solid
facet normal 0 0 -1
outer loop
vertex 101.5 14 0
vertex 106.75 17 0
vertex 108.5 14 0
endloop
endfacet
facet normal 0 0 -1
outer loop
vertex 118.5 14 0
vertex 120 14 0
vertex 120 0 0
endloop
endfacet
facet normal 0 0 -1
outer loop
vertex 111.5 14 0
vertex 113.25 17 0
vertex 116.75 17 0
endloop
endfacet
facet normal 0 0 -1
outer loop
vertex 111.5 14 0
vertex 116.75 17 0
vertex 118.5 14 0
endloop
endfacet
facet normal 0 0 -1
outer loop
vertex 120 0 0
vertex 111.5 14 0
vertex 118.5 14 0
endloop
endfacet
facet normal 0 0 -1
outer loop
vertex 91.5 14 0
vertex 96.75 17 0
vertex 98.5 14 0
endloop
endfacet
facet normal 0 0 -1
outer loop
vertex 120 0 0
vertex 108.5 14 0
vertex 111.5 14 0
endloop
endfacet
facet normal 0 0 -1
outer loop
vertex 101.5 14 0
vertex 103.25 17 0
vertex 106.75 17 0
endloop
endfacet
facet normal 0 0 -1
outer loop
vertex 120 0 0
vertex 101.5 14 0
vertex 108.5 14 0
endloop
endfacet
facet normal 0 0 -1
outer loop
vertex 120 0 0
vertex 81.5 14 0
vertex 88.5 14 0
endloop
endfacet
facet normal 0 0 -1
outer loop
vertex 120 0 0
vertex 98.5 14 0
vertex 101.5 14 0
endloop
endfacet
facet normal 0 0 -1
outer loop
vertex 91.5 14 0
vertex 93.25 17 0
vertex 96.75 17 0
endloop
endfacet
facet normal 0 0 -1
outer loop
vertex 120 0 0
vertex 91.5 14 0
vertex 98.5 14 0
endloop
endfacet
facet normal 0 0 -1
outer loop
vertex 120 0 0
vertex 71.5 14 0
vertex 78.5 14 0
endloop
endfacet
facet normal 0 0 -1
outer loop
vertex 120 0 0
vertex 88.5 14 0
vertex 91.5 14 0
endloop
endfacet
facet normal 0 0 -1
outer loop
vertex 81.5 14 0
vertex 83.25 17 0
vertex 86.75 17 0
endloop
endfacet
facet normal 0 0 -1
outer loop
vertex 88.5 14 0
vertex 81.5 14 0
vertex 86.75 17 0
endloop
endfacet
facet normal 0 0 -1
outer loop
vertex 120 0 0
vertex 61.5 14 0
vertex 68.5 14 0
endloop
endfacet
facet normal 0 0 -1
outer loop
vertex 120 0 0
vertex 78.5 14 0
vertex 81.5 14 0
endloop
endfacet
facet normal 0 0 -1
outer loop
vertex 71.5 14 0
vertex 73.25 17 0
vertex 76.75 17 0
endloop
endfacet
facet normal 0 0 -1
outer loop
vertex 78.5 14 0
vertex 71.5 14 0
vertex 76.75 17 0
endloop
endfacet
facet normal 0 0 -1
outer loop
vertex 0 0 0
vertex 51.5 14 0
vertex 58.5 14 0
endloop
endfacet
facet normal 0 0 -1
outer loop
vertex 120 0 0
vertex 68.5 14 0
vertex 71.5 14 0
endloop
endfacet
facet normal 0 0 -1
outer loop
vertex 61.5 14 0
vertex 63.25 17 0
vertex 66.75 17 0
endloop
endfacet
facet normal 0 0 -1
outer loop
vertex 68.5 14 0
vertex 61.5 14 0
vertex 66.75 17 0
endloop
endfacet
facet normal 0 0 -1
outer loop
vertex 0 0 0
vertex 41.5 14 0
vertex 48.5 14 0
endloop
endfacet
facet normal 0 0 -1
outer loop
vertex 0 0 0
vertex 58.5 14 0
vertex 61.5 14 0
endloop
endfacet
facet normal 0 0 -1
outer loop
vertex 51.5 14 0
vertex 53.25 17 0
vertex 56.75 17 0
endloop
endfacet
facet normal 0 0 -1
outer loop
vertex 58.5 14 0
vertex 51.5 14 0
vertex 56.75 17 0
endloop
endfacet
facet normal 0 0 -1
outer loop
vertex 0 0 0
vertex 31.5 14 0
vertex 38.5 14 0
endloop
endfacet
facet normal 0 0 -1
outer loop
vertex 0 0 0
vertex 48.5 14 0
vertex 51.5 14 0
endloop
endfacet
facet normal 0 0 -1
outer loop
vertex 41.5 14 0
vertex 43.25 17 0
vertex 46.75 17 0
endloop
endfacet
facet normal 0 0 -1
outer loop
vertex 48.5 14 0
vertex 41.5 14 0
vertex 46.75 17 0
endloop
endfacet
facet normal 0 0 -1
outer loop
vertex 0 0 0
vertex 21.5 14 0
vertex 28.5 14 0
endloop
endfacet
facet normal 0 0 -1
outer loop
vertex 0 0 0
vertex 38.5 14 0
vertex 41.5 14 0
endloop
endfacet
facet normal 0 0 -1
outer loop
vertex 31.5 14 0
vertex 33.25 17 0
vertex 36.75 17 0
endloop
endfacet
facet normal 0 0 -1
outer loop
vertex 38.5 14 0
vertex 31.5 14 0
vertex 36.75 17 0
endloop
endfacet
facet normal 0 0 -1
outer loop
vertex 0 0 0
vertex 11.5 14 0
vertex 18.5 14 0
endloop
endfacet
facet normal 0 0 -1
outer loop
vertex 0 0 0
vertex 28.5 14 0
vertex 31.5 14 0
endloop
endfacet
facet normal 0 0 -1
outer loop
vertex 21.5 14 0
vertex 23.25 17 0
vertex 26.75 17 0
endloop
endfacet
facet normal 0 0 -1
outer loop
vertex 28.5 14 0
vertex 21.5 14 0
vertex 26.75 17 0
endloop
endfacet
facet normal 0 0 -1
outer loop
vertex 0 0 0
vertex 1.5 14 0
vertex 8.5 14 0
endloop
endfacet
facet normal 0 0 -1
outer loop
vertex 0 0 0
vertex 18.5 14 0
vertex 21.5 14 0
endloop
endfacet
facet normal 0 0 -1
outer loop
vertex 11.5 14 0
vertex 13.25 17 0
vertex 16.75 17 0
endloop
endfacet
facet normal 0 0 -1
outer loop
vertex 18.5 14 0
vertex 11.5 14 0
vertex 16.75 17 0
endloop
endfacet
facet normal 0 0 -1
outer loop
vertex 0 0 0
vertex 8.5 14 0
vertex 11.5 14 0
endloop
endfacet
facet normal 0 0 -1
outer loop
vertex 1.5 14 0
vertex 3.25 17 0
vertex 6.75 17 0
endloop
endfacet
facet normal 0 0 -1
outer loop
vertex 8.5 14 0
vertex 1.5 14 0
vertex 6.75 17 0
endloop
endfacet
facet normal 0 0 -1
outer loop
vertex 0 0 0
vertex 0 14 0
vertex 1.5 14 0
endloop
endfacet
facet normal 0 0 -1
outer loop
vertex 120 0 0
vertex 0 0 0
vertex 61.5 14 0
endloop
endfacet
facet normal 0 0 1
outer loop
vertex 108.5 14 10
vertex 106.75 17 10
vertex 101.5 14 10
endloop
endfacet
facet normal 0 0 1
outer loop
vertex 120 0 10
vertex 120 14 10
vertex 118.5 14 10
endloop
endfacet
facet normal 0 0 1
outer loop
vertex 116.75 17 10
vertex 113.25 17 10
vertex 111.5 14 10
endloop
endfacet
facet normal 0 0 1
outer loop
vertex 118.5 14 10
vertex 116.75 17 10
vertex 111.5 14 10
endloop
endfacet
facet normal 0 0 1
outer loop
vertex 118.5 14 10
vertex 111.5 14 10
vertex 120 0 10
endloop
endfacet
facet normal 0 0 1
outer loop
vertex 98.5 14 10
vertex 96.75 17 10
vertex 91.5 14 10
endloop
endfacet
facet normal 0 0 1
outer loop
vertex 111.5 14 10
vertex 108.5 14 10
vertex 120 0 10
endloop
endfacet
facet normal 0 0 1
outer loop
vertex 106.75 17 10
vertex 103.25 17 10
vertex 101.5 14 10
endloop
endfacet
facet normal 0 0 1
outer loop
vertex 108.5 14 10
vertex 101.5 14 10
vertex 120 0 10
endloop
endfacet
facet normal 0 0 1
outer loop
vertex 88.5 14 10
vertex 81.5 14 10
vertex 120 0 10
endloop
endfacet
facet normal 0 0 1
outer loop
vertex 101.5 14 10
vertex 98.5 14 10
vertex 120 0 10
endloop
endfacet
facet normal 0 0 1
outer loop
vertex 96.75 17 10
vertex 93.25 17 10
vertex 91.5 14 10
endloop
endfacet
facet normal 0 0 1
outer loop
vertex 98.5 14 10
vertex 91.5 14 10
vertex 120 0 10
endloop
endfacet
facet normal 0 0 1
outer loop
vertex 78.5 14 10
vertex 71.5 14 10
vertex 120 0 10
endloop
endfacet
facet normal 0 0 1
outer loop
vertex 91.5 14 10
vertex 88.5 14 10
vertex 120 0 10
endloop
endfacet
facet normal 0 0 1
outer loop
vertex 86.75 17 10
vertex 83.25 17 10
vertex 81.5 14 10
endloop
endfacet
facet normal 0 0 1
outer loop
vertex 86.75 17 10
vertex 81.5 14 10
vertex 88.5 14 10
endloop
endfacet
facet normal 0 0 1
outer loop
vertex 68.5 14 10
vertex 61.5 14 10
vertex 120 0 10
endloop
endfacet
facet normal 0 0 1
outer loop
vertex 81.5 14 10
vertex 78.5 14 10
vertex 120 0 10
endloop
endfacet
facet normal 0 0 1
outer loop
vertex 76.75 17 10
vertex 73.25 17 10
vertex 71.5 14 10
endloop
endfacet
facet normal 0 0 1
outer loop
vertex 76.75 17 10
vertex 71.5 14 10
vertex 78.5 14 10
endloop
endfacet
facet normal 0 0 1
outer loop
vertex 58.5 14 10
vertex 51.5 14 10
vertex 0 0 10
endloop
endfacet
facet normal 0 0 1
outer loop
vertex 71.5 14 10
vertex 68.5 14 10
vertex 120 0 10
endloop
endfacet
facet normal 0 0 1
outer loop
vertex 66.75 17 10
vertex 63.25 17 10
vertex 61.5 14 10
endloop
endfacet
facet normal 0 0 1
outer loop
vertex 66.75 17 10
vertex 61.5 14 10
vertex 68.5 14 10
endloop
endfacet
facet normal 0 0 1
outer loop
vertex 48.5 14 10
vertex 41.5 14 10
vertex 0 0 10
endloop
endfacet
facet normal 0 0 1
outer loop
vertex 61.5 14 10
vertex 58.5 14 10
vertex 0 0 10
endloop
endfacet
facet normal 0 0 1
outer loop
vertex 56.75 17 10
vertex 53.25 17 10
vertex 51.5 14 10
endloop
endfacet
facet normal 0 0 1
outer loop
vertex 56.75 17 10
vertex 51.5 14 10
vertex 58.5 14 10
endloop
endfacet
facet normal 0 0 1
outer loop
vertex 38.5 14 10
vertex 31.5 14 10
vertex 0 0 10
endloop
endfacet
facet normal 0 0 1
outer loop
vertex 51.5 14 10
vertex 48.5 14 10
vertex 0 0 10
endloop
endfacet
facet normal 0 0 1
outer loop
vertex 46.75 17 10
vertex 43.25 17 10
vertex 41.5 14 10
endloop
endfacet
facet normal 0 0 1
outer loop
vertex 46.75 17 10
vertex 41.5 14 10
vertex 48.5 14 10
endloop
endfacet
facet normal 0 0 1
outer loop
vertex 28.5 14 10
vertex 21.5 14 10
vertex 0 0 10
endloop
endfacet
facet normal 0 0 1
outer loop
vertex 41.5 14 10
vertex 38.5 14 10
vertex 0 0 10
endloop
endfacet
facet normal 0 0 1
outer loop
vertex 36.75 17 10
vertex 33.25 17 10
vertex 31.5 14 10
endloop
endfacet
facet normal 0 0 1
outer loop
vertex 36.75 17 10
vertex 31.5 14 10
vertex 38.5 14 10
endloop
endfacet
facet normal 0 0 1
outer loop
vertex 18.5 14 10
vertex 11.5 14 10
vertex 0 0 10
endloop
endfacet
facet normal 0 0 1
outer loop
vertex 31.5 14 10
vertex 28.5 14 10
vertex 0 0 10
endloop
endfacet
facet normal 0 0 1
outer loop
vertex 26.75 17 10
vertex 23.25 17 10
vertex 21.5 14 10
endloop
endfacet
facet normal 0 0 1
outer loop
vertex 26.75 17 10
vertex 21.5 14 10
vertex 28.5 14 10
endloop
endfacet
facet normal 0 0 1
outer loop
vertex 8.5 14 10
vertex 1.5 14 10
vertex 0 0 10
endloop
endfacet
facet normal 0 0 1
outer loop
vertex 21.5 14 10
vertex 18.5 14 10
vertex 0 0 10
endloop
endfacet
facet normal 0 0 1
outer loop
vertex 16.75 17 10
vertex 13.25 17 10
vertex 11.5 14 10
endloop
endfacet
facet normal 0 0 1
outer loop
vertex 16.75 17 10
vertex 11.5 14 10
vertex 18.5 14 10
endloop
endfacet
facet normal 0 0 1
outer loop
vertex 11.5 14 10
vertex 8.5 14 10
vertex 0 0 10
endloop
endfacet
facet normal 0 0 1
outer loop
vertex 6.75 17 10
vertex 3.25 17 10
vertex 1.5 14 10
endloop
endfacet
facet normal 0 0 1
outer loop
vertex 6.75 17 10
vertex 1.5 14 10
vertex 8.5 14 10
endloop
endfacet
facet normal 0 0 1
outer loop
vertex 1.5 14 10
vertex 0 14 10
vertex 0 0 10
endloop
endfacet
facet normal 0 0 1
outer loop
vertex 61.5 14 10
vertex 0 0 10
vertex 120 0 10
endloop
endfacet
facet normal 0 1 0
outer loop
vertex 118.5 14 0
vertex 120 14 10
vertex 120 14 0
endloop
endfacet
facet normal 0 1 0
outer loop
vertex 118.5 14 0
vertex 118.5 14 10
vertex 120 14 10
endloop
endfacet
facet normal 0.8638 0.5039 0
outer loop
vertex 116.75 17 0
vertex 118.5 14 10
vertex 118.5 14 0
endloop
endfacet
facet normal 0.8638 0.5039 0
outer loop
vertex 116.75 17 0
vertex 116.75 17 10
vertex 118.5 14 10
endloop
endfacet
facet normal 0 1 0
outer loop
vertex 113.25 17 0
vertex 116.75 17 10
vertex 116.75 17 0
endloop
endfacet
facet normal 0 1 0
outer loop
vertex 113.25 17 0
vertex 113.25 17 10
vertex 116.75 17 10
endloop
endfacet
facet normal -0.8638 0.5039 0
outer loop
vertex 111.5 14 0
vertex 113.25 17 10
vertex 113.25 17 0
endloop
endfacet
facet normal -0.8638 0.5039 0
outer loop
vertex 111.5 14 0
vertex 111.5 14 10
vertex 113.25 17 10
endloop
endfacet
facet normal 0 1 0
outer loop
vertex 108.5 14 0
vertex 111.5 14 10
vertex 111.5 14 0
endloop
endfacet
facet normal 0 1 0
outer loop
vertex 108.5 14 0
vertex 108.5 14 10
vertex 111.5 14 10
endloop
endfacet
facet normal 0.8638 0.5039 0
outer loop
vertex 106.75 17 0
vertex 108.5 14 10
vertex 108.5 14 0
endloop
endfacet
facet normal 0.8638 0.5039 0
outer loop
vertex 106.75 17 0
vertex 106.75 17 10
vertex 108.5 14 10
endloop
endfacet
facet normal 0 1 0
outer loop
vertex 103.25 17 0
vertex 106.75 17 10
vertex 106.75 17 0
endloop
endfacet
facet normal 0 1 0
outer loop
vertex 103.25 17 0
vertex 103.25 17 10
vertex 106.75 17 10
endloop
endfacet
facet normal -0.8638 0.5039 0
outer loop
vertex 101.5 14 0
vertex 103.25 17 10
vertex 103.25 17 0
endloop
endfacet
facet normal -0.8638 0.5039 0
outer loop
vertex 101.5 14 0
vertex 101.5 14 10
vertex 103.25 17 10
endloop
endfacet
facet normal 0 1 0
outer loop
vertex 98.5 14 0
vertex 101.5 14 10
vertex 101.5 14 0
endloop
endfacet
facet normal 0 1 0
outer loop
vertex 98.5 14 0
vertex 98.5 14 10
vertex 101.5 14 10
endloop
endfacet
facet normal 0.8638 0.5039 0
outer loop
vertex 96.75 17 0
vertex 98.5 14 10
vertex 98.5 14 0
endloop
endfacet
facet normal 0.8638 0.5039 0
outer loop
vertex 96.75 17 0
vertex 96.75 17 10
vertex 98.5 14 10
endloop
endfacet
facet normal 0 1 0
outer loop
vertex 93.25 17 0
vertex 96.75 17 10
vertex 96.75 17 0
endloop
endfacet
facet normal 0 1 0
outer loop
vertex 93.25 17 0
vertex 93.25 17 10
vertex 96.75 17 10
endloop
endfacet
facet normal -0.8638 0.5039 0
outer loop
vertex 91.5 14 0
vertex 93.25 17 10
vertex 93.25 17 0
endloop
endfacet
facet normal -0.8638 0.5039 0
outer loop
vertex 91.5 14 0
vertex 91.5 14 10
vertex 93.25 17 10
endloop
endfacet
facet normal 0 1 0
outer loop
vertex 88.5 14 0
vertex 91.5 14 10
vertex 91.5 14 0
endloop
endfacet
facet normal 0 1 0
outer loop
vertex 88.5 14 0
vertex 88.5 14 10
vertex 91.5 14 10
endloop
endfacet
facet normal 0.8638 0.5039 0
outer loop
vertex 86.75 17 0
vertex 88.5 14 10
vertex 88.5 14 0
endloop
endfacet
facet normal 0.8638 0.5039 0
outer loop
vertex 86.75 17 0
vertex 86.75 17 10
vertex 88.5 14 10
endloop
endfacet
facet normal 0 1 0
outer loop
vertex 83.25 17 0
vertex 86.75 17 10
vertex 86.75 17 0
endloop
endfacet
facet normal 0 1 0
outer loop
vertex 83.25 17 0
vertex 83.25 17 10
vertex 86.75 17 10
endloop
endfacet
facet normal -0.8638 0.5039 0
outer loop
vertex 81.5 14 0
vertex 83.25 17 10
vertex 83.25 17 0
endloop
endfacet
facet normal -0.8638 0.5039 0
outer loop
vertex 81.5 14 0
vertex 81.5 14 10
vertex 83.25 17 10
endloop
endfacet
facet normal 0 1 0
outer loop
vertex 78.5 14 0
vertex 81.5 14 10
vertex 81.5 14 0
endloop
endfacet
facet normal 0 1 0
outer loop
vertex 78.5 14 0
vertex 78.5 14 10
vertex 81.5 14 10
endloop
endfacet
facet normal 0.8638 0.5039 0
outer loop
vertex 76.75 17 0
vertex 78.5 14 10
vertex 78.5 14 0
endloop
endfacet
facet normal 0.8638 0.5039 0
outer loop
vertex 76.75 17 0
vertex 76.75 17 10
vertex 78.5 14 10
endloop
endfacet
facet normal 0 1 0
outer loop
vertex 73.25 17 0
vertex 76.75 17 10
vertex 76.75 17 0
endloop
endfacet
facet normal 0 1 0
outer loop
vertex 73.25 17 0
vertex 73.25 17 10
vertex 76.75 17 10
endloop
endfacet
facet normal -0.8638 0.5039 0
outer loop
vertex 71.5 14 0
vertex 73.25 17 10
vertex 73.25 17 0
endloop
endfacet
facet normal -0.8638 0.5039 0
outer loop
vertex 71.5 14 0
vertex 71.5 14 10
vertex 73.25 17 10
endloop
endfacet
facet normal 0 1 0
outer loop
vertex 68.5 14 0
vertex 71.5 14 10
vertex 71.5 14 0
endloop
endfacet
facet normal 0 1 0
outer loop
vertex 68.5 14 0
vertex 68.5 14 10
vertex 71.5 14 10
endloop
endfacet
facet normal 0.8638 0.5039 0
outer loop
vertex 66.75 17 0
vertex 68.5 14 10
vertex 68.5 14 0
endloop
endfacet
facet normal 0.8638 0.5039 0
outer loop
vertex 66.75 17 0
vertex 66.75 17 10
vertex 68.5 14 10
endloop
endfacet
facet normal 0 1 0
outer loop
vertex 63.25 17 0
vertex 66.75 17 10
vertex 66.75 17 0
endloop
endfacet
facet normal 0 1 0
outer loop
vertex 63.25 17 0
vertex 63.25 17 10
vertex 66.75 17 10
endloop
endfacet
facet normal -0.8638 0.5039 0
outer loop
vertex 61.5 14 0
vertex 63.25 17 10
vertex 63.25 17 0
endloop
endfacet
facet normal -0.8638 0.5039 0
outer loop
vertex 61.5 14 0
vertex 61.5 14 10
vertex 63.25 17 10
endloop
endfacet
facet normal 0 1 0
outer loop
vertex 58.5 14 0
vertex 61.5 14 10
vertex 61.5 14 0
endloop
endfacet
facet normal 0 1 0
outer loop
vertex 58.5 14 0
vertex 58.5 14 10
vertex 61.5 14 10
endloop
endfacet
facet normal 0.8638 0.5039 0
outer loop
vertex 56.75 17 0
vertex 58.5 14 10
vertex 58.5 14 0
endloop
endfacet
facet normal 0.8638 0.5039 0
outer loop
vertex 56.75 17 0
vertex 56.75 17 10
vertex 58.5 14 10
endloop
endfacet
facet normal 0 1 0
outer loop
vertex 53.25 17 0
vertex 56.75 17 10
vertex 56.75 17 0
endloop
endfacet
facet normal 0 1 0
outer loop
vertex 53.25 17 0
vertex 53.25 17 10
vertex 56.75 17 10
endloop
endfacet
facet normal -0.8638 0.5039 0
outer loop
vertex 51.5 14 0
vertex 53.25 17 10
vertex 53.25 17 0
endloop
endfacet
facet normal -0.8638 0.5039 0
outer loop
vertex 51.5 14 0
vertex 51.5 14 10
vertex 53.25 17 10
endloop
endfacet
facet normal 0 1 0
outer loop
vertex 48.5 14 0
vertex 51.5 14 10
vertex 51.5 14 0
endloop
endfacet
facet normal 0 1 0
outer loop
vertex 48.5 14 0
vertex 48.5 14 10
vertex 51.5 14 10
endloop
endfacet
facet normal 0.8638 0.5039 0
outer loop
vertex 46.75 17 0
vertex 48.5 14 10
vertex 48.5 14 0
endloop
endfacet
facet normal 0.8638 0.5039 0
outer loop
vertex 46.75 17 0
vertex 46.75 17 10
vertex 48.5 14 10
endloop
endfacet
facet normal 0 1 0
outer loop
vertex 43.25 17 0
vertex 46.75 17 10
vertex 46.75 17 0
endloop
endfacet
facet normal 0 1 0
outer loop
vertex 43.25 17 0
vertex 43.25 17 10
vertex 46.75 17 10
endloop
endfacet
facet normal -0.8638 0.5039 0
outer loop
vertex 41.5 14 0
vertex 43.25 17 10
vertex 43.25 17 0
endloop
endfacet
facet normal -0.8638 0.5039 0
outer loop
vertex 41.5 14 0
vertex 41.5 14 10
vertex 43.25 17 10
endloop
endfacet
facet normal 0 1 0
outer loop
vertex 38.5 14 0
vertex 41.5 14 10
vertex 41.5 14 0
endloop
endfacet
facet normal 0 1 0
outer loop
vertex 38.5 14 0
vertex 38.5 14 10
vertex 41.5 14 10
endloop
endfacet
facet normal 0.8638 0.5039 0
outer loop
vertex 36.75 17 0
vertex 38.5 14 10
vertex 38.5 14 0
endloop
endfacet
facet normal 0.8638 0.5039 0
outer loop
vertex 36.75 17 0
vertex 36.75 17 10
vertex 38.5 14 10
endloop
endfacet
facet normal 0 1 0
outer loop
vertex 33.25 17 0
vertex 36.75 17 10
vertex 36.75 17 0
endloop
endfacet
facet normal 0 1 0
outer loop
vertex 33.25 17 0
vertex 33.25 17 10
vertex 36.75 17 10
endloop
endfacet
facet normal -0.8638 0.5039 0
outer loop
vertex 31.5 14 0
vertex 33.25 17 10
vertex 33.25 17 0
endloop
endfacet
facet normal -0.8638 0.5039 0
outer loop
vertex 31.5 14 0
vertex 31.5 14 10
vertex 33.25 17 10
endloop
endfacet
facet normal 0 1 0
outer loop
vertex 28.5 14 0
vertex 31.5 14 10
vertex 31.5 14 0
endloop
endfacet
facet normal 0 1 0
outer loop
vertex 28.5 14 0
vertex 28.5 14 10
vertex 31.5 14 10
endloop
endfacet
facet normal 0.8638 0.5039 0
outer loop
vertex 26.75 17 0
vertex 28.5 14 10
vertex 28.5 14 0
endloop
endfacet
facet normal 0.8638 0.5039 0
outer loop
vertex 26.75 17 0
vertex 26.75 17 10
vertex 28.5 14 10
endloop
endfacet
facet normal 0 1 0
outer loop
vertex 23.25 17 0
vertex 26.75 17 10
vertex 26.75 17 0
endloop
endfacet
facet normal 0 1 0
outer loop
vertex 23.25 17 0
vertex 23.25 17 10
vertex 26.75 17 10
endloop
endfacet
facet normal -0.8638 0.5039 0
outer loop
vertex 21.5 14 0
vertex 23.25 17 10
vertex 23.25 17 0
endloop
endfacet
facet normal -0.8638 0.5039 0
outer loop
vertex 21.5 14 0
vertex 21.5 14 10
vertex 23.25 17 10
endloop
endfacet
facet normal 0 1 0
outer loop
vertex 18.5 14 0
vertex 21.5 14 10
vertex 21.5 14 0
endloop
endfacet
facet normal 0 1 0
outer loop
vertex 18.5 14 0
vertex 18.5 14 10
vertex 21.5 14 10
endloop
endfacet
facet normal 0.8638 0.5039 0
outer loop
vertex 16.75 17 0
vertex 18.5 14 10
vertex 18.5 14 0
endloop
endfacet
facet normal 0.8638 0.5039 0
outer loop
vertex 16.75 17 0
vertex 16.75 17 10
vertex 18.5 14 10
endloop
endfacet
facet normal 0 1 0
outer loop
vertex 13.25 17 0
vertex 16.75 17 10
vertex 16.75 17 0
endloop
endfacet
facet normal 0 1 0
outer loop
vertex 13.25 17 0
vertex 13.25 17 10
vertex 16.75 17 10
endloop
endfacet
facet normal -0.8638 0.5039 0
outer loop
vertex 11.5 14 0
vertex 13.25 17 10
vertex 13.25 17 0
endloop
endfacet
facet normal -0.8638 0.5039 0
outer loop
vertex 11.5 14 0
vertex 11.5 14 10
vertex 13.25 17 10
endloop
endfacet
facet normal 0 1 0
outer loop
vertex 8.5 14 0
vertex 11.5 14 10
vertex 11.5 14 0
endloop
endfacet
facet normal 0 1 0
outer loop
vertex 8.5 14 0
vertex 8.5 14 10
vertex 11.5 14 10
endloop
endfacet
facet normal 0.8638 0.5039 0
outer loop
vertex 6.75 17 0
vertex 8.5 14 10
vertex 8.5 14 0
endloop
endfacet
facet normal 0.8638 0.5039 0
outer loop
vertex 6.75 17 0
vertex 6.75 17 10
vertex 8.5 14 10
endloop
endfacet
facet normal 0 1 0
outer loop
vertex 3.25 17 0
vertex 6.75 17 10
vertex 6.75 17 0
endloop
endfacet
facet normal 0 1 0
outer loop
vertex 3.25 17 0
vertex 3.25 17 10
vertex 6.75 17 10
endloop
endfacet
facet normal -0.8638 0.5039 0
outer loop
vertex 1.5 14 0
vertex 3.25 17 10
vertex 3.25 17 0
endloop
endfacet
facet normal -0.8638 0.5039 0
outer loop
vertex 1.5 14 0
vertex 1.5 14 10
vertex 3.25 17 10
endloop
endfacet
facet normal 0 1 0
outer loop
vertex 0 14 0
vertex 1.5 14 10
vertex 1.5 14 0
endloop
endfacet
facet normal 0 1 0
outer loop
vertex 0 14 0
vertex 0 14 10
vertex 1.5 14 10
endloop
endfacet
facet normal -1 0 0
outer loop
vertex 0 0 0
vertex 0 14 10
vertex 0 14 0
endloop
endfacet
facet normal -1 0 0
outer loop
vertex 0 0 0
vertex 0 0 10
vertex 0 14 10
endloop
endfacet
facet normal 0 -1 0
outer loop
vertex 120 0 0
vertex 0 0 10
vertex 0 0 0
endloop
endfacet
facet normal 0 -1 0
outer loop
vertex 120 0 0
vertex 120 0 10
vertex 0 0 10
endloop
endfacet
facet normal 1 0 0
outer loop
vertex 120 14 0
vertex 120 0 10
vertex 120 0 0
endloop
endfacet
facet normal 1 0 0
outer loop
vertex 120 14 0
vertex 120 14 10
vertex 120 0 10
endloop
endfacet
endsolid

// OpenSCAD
$fn = 32;

// ----------------------------------------------------------------------
// Gear rack: 12 teeth, pitch 10 mm
// ----------------------------------------------------------------------

// --- parameters (mm) ---
teeth = 12;               // number of teeth
pitch = 10;               // tooth pitch, X
root_w = 7;               // tooth width at the root
tip_w = 3.5;              // tooth width at the tip
base_h = 14;              // rack body height, Y
tooth_h = 3;              // tooth height above the body
plate_t = 10;             // rack width, Z (extrusion height)

rack_l = teeth * pitch;  // overall length
total_h = base_h + tooth_h;  // overall height

profile = [[0, 0], [120, 0], [120, 14], [118.5, 14], [116.75, 17], [113.25, 17], [111.5, 14], [108.5, 14], [106.75, 17], [103.25, 17], [101.5, 14], [98.5, 14], [96.75, 17], [93.25, 17], [91.5, 14], [88.5, 14], [86.75, 17], [83.25, 17], [81.5, 14], [78.5, 14], [76.75, 17], [73.25, 17], [71.5, 14], [68.5, 14], [66.75, 17], [63.25, 17], [61.5, 14], [58.5, 14], [56.75, 17], [53.25, 17], [51.5, 14], [48.5, 14], [46.75, 17], [43.25, 17], [41.5, 14], [38.5, 14], [36.75, 17], [33.25, 17], [31.5, 14], [28.5, 14], [26.75, 17], [23.25, 17], [21.5, 14], [18.5, 14], [16.75, 17], [13.25, 17], [11.5, 14], [8.5, 14], [6.75, 17], [3.25, 17], [1.5, 14], [0, 14]];  // primary outline, 52 points, counter clockwise

// --- the one profile operation ---
linear_extrude(height = plate_t) polygon(points = profile);
